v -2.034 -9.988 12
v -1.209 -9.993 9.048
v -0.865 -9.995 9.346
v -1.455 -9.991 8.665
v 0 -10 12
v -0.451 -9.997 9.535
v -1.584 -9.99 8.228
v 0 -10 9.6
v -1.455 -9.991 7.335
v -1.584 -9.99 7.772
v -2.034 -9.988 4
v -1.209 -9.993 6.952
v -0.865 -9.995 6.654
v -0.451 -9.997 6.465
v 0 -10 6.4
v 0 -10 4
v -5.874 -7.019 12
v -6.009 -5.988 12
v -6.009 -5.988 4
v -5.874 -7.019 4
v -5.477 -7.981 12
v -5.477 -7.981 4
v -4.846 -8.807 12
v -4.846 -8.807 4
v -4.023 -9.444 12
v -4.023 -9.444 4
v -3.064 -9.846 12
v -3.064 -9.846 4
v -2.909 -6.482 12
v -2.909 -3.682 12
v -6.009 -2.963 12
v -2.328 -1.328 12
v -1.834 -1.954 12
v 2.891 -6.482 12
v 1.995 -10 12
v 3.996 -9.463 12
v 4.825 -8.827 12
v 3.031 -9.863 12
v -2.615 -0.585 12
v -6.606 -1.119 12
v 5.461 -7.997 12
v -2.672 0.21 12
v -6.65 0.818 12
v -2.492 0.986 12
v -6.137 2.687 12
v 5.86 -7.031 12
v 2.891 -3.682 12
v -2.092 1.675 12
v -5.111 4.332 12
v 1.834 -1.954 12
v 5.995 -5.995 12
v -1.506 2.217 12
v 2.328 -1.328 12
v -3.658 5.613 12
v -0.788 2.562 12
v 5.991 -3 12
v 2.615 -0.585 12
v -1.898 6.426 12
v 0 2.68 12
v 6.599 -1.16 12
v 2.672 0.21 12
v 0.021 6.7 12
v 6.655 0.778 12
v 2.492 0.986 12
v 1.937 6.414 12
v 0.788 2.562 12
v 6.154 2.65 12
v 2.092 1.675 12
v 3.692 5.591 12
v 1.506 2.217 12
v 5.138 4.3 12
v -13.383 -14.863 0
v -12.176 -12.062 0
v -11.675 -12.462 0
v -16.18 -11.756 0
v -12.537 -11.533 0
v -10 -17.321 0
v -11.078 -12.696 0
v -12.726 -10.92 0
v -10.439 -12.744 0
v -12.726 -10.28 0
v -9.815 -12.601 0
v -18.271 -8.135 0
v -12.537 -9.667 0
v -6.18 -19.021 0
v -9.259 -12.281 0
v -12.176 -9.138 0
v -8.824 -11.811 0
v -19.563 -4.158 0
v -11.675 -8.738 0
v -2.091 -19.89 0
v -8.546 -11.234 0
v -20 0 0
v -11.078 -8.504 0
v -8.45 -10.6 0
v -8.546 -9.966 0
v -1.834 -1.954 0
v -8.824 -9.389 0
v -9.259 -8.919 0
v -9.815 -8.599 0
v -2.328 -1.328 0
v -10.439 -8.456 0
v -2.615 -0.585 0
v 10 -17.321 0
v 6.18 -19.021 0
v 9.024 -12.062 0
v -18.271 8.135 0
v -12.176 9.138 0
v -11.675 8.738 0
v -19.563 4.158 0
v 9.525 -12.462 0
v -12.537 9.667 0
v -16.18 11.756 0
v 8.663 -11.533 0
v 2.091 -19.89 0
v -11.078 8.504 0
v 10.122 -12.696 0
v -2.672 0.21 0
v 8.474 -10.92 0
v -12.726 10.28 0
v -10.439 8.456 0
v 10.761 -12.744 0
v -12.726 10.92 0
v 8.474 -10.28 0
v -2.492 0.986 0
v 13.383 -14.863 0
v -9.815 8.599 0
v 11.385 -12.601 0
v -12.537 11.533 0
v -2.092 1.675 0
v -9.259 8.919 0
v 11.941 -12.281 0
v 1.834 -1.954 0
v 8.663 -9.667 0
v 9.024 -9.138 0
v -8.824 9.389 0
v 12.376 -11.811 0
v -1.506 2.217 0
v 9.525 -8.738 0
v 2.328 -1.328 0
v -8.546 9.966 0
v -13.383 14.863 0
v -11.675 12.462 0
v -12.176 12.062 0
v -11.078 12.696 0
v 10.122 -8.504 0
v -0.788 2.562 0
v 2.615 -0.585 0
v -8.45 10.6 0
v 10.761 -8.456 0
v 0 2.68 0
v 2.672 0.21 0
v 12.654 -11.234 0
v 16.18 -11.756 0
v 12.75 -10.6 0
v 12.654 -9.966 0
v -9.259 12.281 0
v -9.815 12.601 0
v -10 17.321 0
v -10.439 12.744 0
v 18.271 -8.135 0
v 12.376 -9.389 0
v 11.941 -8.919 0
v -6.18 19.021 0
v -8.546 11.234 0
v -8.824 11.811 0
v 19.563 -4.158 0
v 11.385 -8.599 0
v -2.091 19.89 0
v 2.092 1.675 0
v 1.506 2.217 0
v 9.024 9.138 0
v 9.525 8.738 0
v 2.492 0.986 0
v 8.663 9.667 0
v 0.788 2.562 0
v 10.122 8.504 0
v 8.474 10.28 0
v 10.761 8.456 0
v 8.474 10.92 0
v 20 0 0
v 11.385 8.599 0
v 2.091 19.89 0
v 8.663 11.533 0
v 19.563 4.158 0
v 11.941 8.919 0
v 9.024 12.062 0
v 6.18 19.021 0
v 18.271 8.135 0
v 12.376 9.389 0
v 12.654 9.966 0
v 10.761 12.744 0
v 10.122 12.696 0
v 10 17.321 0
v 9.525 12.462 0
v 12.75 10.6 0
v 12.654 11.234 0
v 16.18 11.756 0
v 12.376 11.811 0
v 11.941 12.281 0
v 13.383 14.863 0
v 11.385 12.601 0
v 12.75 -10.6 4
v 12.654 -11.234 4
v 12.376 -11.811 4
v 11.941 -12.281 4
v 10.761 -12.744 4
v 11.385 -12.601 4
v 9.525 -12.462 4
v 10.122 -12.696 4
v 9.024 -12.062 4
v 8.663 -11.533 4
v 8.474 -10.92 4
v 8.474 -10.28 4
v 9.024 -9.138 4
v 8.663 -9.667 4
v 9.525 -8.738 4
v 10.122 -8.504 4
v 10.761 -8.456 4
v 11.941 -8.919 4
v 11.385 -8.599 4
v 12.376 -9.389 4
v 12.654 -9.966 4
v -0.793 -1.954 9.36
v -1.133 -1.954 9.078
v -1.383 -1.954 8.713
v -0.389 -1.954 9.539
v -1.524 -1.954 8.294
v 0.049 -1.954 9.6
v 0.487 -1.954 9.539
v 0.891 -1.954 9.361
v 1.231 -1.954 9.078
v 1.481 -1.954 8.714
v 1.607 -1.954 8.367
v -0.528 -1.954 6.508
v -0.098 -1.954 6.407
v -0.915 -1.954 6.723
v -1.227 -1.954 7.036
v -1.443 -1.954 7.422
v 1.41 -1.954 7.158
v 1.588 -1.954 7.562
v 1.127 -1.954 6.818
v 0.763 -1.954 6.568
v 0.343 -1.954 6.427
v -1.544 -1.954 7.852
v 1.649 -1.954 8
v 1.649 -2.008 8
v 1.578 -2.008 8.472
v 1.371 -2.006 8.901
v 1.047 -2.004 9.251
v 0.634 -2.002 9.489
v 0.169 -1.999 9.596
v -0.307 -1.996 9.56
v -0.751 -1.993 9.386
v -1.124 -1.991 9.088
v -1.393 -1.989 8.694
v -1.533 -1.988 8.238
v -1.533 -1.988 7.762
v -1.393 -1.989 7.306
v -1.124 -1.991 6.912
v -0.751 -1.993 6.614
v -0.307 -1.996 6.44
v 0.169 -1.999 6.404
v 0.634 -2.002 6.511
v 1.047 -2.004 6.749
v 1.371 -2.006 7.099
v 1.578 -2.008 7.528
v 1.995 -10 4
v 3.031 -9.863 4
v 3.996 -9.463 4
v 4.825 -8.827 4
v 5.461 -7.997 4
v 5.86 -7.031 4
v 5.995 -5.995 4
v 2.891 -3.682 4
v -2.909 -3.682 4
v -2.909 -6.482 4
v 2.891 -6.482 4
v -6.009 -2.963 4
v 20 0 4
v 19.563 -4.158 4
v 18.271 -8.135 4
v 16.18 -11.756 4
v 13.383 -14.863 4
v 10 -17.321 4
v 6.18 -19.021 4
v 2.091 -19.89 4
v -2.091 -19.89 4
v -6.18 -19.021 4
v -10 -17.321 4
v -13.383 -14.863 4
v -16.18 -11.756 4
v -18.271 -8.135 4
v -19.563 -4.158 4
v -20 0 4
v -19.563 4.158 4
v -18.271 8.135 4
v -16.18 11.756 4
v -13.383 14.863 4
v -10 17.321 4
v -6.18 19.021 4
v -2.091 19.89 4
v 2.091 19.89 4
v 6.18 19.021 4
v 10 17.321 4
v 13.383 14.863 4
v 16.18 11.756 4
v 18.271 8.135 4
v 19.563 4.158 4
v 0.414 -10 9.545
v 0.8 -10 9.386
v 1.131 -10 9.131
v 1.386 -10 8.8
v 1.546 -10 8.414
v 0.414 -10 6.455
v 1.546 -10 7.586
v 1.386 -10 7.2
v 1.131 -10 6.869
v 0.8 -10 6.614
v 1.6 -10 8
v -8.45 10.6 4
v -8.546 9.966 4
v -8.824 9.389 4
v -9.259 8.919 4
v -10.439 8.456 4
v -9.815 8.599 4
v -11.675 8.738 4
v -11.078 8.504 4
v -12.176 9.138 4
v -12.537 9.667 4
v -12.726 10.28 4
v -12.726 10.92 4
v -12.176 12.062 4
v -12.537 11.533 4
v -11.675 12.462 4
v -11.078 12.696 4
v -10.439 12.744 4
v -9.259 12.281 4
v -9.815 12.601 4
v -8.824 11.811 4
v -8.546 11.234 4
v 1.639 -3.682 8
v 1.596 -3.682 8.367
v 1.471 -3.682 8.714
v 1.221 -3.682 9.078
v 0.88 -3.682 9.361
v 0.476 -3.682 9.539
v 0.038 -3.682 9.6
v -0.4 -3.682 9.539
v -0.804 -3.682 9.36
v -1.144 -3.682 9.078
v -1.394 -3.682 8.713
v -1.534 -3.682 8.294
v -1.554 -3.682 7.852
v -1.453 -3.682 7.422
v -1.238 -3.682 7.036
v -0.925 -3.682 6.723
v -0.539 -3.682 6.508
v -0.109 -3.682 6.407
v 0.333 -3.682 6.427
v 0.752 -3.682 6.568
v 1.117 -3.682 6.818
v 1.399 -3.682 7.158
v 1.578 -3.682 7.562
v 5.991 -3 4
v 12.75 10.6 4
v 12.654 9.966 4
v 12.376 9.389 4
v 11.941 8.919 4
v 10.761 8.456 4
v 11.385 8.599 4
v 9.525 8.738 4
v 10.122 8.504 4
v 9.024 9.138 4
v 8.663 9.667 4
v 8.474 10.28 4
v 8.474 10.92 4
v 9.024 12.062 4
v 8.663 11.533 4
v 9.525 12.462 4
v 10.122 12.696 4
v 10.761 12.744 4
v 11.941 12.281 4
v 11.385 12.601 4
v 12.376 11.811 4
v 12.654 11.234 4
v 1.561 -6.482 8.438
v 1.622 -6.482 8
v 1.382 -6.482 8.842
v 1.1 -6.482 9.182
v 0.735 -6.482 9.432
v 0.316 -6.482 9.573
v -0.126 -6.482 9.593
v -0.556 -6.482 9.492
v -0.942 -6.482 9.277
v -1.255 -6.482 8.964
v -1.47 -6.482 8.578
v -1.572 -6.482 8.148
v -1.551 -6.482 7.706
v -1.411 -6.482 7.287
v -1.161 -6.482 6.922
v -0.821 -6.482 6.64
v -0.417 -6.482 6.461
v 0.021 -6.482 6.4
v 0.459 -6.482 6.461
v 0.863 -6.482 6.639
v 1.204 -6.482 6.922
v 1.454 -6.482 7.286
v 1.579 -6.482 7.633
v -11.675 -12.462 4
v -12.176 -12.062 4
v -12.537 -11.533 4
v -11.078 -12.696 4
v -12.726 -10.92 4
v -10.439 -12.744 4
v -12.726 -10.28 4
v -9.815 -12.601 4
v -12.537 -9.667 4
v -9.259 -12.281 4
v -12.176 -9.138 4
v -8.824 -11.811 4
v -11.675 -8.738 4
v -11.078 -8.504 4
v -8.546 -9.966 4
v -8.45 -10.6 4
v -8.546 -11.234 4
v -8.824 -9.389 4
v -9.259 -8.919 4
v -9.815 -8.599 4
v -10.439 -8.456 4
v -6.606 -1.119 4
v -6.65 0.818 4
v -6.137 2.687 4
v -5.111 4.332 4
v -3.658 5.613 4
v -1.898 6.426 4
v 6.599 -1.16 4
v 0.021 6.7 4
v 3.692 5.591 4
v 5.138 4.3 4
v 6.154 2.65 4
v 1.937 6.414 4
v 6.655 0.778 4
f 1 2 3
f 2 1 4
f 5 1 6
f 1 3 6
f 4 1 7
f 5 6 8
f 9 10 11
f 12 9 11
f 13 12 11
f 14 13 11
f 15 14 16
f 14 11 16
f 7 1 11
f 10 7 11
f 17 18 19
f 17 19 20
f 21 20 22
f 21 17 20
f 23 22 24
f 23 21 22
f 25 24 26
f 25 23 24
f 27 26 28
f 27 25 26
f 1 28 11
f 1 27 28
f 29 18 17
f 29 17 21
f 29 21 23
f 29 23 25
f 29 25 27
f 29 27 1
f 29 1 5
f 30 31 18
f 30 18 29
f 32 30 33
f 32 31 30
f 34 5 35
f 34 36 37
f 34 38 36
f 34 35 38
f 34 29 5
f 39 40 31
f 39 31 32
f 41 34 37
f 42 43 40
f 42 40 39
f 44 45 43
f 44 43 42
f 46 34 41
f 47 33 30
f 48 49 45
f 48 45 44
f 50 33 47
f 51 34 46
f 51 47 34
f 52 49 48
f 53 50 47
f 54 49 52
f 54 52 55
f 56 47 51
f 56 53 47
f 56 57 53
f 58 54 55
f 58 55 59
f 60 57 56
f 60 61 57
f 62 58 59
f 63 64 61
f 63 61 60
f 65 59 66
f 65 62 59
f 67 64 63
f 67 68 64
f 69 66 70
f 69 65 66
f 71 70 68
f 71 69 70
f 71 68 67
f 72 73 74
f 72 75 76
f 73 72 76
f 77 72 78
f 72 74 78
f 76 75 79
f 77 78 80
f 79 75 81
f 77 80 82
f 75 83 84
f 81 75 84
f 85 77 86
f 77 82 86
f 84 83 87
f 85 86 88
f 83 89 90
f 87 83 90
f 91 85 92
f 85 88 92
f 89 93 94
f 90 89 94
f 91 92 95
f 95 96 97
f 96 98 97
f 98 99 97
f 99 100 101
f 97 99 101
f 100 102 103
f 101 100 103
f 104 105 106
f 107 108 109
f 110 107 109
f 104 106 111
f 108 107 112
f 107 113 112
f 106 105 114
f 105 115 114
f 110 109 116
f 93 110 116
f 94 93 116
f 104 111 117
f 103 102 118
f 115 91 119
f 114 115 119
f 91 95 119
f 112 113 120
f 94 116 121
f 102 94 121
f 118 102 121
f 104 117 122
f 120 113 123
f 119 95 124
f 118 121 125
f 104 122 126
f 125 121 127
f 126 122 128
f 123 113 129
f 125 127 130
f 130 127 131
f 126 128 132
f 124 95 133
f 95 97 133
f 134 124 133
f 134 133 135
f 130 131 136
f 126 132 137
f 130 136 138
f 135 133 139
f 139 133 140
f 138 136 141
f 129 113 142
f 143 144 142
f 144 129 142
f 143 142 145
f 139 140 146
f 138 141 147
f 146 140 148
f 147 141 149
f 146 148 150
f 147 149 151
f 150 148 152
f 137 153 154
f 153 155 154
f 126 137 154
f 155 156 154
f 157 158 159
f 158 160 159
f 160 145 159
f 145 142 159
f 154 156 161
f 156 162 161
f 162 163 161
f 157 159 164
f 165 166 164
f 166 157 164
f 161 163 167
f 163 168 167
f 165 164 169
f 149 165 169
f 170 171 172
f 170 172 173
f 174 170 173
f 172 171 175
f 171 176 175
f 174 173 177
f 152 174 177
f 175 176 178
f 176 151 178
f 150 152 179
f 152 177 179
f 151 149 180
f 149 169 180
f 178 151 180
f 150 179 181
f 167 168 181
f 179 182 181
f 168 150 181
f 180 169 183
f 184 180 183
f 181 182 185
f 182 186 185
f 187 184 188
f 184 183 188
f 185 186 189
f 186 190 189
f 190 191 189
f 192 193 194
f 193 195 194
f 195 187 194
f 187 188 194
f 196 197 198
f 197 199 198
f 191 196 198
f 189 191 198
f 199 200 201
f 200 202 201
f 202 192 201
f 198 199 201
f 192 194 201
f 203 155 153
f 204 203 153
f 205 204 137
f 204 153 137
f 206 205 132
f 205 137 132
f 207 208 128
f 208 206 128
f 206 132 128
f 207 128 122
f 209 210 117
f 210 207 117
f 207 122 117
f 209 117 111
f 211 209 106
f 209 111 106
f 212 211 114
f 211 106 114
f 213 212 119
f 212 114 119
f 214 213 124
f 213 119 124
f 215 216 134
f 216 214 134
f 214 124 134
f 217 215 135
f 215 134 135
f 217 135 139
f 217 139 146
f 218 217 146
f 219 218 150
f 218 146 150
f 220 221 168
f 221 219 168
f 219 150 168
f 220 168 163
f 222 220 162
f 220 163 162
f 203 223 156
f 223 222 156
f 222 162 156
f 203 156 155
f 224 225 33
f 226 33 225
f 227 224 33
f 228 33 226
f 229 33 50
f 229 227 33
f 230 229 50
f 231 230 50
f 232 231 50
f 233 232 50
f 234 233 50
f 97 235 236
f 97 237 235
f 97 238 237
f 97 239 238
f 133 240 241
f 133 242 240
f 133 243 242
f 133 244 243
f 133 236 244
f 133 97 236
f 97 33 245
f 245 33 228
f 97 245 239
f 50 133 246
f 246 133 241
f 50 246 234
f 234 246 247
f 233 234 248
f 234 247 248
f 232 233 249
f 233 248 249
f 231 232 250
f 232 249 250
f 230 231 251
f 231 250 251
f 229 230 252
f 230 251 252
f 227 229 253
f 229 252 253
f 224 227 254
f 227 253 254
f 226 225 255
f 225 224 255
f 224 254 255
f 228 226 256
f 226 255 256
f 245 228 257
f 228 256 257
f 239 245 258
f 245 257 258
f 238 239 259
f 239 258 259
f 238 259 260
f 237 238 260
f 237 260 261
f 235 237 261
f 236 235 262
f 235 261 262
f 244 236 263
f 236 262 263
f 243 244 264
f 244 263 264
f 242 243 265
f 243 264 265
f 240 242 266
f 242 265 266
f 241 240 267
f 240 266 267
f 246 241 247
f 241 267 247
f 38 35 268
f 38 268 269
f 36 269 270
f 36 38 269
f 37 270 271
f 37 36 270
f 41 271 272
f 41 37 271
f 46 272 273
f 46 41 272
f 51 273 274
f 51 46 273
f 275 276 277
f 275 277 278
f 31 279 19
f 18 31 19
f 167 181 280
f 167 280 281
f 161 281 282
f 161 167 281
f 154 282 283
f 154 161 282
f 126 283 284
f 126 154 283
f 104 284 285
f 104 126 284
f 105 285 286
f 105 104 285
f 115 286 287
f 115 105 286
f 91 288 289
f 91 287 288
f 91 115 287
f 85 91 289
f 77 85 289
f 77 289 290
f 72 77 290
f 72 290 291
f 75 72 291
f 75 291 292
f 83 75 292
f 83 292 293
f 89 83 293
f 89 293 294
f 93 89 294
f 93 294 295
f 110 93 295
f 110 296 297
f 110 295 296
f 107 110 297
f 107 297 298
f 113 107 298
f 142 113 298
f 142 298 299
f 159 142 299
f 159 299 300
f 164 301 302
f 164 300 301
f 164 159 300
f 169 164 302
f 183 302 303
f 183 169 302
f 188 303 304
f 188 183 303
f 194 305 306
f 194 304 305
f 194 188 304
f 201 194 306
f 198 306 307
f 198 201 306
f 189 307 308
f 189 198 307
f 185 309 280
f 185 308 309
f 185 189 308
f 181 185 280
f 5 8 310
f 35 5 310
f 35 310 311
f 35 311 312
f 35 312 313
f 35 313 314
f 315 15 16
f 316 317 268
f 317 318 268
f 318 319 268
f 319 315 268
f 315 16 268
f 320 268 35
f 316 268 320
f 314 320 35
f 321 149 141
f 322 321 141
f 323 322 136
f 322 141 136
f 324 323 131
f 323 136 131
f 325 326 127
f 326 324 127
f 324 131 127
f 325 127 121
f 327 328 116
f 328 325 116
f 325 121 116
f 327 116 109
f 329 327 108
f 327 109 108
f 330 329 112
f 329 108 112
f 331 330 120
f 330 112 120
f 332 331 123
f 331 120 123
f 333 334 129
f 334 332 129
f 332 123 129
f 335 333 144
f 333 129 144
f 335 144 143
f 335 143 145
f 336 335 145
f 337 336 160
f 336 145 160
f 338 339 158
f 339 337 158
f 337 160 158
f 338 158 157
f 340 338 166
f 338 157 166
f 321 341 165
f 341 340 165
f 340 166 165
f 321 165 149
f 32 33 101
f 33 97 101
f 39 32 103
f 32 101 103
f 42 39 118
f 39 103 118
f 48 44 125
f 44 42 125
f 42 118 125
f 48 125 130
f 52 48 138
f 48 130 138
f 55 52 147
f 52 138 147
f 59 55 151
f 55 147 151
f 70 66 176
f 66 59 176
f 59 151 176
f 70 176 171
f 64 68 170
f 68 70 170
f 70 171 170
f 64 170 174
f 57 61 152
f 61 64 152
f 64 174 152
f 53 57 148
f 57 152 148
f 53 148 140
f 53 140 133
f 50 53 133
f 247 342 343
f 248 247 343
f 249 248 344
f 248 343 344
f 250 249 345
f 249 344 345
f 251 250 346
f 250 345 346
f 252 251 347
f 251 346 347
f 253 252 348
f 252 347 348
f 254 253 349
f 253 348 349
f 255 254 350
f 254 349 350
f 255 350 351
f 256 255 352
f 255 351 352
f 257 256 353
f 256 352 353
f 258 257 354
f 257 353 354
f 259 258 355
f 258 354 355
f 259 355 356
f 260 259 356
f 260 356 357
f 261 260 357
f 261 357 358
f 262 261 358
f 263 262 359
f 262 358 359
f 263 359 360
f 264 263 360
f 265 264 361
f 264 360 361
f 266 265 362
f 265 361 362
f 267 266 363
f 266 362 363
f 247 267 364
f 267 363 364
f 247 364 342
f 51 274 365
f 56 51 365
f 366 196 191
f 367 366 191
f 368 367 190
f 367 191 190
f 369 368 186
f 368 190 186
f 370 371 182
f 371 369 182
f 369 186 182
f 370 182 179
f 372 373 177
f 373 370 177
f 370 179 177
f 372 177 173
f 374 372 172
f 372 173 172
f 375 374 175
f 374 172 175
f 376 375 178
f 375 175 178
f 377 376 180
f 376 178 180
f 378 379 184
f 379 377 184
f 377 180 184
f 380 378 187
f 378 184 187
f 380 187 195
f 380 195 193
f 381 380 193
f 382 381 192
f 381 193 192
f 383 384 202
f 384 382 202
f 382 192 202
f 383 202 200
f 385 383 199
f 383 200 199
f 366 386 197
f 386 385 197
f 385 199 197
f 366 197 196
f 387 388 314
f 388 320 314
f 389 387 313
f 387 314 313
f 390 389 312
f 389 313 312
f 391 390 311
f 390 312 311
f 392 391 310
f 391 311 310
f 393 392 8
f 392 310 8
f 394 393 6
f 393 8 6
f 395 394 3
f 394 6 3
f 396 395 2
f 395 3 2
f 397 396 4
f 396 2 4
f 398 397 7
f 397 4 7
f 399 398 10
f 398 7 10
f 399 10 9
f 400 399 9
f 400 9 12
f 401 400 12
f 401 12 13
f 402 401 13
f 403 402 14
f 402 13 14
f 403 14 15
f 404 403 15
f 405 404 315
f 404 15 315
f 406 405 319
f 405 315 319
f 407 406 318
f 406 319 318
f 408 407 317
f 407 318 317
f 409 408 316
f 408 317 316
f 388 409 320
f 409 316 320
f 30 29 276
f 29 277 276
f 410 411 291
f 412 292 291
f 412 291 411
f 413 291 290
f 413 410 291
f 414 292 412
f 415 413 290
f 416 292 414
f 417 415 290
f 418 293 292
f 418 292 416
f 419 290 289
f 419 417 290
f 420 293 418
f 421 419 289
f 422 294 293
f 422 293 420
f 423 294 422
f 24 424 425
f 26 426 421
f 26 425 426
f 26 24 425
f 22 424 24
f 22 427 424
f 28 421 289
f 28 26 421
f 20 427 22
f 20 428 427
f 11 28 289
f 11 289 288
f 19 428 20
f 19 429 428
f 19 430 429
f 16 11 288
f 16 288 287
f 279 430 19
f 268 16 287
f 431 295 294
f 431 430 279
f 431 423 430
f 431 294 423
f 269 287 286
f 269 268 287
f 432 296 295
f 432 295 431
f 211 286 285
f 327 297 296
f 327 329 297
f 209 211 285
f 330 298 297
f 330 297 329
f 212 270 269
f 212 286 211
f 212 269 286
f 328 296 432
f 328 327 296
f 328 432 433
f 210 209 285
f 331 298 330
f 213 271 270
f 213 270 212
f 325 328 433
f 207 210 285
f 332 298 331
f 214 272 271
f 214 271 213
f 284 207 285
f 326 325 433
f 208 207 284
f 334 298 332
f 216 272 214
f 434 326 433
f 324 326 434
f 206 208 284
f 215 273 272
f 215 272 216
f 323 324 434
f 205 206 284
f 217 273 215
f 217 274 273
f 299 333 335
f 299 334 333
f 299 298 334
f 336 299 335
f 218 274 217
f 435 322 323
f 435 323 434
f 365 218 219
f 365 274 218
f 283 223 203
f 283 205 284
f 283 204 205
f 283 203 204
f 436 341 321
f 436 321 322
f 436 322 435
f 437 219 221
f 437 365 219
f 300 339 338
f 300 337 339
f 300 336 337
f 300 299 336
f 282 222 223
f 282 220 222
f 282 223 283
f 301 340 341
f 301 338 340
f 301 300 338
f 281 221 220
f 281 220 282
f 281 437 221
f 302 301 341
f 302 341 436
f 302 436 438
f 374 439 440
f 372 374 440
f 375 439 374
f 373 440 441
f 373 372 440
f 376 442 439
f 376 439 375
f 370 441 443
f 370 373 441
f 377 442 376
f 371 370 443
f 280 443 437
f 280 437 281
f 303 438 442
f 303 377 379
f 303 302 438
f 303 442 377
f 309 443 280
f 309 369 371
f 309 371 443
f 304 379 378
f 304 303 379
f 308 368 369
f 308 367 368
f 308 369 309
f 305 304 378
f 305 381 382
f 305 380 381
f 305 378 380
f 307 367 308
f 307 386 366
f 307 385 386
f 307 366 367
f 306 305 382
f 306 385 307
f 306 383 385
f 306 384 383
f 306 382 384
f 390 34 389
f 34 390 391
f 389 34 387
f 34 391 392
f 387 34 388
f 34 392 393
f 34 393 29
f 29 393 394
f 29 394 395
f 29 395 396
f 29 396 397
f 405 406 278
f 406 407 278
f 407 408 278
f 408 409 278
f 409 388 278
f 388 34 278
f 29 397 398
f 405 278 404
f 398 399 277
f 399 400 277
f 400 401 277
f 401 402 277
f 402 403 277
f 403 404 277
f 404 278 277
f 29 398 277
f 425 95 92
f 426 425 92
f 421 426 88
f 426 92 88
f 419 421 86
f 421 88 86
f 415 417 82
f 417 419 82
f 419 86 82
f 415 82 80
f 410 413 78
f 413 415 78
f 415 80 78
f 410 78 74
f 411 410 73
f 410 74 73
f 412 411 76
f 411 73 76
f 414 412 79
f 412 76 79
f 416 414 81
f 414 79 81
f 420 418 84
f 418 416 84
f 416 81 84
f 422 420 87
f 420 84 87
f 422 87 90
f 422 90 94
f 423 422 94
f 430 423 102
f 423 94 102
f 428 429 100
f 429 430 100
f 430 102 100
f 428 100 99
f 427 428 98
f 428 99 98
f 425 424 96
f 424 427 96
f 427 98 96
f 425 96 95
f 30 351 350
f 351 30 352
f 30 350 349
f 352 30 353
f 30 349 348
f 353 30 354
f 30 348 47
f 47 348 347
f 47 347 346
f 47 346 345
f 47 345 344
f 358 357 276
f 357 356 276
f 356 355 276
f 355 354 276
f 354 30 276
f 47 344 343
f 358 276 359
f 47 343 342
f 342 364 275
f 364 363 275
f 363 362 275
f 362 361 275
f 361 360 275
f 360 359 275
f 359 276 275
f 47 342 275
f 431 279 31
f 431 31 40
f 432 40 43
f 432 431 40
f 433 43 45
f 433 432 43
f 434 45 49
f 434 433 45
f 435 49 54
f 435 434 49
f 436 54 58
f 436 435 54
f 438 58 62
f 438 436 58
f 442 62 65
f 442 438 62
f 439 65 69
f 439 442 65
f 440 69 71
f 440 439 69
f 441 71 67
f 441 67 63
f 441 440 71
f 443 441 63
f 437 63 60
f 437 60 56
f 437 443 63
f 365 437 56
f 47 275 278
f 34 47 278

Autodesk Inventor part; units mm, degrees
ref_plane "YZ Plane" through (0, 0, 0) normal (1, 0, 0) x (0, 1, 0)
ref_plane "XZ Plane" through (0, 0, 0) normal (0, 1, 0) x (-1, 0, 0)
ref_plane "XY Plane" through (0, 0, 0) normal (0, 0, 1) x (1, 0, 0)
sketch "Szkic1" plane through (0, 0, 0) normal (0, 0, 1) x (1, 0, 0)
  circle A0 centre (0, 0) radius 20
  circle A1 centre (10.6, 10.6) radius 2.15
  circle A2 centre (-10.6, 10.6) radius 2.15
  circle A3 centre (-10.6, -10.6) radius 2.15
  circle A4 centre (10.6, -10.6) radius 2.15
  arc A5 (1.8342, -1.954) -> (-1.8342, -1.954) centre (0, 0) ccw
  line L0 (0, -1.954) -> (1.8342, -1.954)
  line L1 (0, -1.954) -> (-1.8342, -1.954)
  dimension "d0" = 40
  dimension "d3" = 4.3
  dimension "d6" = 360
  dimension "d8" = 5.36
extrude "Wyciągnięcie proste1" add sketch "Szkic1" along normal blind 4
sketch "Szkic2" plane through (0, 0, 4) normal (0, 0, 1) x (1, 0, 0)
  arc A0 (5.9908, -3) -> (-6.0091, -2.9632) centre (0, 0) ccw
  circle A1 centre (0, 0) radius 20 projected
  line L0 (0, -10) -> (6, -10)
  line L1 (6, -10) -> (5.9908, -3)
  line L2 (5.9908, -3) -> (-6.0091, -2.9632)
  line L3 (-6.0091, -2.9632) -> (-6.0091, -9.9632)
  line L4 (-6.0091, -9.9632) -> (0, -10)
  line L5 (-0.0091, -3.6816) -> (2.8909, -3.6816)
  line L6 (2.8909, -3.6816) -> (2.8909, -6.4816)
  line L7 (2.8909, -6.4816) -> (-2.9091, -6.4816)
  line L8 (-2.9091, -6.4816) -> (-2.9091, -3.6816)
  line L9 (-2.9091, -3.6816) -> (-0.0091, -3.6816)
  dimension "d12" = 13.4
  dimension "d19" = 6
  dimension "d20" = 7
  dimension "d21" = 12
  dimension "d24" = 7
  dimension "d26" = 2.9
  dimension "d27" = 2.8
  dimension "d28" = 5.8
extrude "Wyciągnięcie proste2" add sketch "Szkic2" along normal blind 8 contours L1 L0 L4 L3 L2
sketch "Szkic3" plane through (0, 0, 4) normal (0, 0, 1) x (1, 0, 0)
  circle A0 centre (0, 0) radius 6.7
  line L0 (-6.0091, -9.9632) -> (-6.0091, -2.9632) projected
  line L1 (6, -10) -> (5.9908, -3) projected
  line L2 (-6.0091, -2.9632) -> (5.9908, -3)
  dimension "d31" = 13.4
sketch "Szkic4" plane through (0, 0, 4) normal (0, 0, 1) x (1, 0, 0)
  arc A0 (1.8342, -1.954) -> (-1.8342, -1.954) centre (0, 0) ccw projected
  line L0 (-1.8342, -1.954) -> (1.8342, -1.954)
  arc A1 (1.8342, -1.954) -> (-1.8342, -1.954) centre (0, 0) ccw
sketch "Szkic5" plane through (0, 0, 4) normal (0, 0, 1) x (1, 0, 0)
  point P0 (0, 0)
extrude "Wyciągnięcie proste3" add sketch "Szkic3" along normal blind 8 contours A0 L2 picked at (-1.2468, -0.1308)
extrude "Wyciągnięcie proste4" cut sketch "Szkic4" along normal blind 8
sketch "Szkic6" plane through (0, -10, 4) normal (-0.0061262, -0.9999812, 0) x (0.9999812, -0.0061262, 0)
  circle A0 centre (0, 4) radius 1.6
  point P0 (-0.0613, -4)
  point P1 (0, 0)
  dimension "d37" = 3.2
extrude "Wyciągnięcie proste5" cut sketch "Szkic6" against normal blind 8
sketch "Szkic7" plane through (0.049, -2.0002, 8) normal (-0.0061262, -0.9999812, 0) x (0.9999812, -0.0061262, 0)
  point P0 (-0.0613, -8)
sketch "Szkic8" plane through (0.049, -2.0002, 8) normal (-0.0061262, -0.9999812, 0) x (0.9999812, -0.0061262, 0)
  circle A0 centre (0, 0) radius 1.6
  point P0 (-0.0613, -8)
  dimension "d40" = 3.2
extrude "Wyciągnięcie proste6" cut sketch "Szkic8" against normal blind 2
fillet "Zaokrąglenie1" radius 4 1 edges at (-6.0091, -9.9632, 8)
fillet "Zaokrąglenie2" radius 4 1 edges at (6, -10, 8)
sketch "Szkic9" plane through (0, -10, 8) normal (-0.0061262, -0.9999812, 0) x (0.9999812, -0.0061262, 0)
  point P0 (-0.0613, -8)
properties part number "sprzeglo"
